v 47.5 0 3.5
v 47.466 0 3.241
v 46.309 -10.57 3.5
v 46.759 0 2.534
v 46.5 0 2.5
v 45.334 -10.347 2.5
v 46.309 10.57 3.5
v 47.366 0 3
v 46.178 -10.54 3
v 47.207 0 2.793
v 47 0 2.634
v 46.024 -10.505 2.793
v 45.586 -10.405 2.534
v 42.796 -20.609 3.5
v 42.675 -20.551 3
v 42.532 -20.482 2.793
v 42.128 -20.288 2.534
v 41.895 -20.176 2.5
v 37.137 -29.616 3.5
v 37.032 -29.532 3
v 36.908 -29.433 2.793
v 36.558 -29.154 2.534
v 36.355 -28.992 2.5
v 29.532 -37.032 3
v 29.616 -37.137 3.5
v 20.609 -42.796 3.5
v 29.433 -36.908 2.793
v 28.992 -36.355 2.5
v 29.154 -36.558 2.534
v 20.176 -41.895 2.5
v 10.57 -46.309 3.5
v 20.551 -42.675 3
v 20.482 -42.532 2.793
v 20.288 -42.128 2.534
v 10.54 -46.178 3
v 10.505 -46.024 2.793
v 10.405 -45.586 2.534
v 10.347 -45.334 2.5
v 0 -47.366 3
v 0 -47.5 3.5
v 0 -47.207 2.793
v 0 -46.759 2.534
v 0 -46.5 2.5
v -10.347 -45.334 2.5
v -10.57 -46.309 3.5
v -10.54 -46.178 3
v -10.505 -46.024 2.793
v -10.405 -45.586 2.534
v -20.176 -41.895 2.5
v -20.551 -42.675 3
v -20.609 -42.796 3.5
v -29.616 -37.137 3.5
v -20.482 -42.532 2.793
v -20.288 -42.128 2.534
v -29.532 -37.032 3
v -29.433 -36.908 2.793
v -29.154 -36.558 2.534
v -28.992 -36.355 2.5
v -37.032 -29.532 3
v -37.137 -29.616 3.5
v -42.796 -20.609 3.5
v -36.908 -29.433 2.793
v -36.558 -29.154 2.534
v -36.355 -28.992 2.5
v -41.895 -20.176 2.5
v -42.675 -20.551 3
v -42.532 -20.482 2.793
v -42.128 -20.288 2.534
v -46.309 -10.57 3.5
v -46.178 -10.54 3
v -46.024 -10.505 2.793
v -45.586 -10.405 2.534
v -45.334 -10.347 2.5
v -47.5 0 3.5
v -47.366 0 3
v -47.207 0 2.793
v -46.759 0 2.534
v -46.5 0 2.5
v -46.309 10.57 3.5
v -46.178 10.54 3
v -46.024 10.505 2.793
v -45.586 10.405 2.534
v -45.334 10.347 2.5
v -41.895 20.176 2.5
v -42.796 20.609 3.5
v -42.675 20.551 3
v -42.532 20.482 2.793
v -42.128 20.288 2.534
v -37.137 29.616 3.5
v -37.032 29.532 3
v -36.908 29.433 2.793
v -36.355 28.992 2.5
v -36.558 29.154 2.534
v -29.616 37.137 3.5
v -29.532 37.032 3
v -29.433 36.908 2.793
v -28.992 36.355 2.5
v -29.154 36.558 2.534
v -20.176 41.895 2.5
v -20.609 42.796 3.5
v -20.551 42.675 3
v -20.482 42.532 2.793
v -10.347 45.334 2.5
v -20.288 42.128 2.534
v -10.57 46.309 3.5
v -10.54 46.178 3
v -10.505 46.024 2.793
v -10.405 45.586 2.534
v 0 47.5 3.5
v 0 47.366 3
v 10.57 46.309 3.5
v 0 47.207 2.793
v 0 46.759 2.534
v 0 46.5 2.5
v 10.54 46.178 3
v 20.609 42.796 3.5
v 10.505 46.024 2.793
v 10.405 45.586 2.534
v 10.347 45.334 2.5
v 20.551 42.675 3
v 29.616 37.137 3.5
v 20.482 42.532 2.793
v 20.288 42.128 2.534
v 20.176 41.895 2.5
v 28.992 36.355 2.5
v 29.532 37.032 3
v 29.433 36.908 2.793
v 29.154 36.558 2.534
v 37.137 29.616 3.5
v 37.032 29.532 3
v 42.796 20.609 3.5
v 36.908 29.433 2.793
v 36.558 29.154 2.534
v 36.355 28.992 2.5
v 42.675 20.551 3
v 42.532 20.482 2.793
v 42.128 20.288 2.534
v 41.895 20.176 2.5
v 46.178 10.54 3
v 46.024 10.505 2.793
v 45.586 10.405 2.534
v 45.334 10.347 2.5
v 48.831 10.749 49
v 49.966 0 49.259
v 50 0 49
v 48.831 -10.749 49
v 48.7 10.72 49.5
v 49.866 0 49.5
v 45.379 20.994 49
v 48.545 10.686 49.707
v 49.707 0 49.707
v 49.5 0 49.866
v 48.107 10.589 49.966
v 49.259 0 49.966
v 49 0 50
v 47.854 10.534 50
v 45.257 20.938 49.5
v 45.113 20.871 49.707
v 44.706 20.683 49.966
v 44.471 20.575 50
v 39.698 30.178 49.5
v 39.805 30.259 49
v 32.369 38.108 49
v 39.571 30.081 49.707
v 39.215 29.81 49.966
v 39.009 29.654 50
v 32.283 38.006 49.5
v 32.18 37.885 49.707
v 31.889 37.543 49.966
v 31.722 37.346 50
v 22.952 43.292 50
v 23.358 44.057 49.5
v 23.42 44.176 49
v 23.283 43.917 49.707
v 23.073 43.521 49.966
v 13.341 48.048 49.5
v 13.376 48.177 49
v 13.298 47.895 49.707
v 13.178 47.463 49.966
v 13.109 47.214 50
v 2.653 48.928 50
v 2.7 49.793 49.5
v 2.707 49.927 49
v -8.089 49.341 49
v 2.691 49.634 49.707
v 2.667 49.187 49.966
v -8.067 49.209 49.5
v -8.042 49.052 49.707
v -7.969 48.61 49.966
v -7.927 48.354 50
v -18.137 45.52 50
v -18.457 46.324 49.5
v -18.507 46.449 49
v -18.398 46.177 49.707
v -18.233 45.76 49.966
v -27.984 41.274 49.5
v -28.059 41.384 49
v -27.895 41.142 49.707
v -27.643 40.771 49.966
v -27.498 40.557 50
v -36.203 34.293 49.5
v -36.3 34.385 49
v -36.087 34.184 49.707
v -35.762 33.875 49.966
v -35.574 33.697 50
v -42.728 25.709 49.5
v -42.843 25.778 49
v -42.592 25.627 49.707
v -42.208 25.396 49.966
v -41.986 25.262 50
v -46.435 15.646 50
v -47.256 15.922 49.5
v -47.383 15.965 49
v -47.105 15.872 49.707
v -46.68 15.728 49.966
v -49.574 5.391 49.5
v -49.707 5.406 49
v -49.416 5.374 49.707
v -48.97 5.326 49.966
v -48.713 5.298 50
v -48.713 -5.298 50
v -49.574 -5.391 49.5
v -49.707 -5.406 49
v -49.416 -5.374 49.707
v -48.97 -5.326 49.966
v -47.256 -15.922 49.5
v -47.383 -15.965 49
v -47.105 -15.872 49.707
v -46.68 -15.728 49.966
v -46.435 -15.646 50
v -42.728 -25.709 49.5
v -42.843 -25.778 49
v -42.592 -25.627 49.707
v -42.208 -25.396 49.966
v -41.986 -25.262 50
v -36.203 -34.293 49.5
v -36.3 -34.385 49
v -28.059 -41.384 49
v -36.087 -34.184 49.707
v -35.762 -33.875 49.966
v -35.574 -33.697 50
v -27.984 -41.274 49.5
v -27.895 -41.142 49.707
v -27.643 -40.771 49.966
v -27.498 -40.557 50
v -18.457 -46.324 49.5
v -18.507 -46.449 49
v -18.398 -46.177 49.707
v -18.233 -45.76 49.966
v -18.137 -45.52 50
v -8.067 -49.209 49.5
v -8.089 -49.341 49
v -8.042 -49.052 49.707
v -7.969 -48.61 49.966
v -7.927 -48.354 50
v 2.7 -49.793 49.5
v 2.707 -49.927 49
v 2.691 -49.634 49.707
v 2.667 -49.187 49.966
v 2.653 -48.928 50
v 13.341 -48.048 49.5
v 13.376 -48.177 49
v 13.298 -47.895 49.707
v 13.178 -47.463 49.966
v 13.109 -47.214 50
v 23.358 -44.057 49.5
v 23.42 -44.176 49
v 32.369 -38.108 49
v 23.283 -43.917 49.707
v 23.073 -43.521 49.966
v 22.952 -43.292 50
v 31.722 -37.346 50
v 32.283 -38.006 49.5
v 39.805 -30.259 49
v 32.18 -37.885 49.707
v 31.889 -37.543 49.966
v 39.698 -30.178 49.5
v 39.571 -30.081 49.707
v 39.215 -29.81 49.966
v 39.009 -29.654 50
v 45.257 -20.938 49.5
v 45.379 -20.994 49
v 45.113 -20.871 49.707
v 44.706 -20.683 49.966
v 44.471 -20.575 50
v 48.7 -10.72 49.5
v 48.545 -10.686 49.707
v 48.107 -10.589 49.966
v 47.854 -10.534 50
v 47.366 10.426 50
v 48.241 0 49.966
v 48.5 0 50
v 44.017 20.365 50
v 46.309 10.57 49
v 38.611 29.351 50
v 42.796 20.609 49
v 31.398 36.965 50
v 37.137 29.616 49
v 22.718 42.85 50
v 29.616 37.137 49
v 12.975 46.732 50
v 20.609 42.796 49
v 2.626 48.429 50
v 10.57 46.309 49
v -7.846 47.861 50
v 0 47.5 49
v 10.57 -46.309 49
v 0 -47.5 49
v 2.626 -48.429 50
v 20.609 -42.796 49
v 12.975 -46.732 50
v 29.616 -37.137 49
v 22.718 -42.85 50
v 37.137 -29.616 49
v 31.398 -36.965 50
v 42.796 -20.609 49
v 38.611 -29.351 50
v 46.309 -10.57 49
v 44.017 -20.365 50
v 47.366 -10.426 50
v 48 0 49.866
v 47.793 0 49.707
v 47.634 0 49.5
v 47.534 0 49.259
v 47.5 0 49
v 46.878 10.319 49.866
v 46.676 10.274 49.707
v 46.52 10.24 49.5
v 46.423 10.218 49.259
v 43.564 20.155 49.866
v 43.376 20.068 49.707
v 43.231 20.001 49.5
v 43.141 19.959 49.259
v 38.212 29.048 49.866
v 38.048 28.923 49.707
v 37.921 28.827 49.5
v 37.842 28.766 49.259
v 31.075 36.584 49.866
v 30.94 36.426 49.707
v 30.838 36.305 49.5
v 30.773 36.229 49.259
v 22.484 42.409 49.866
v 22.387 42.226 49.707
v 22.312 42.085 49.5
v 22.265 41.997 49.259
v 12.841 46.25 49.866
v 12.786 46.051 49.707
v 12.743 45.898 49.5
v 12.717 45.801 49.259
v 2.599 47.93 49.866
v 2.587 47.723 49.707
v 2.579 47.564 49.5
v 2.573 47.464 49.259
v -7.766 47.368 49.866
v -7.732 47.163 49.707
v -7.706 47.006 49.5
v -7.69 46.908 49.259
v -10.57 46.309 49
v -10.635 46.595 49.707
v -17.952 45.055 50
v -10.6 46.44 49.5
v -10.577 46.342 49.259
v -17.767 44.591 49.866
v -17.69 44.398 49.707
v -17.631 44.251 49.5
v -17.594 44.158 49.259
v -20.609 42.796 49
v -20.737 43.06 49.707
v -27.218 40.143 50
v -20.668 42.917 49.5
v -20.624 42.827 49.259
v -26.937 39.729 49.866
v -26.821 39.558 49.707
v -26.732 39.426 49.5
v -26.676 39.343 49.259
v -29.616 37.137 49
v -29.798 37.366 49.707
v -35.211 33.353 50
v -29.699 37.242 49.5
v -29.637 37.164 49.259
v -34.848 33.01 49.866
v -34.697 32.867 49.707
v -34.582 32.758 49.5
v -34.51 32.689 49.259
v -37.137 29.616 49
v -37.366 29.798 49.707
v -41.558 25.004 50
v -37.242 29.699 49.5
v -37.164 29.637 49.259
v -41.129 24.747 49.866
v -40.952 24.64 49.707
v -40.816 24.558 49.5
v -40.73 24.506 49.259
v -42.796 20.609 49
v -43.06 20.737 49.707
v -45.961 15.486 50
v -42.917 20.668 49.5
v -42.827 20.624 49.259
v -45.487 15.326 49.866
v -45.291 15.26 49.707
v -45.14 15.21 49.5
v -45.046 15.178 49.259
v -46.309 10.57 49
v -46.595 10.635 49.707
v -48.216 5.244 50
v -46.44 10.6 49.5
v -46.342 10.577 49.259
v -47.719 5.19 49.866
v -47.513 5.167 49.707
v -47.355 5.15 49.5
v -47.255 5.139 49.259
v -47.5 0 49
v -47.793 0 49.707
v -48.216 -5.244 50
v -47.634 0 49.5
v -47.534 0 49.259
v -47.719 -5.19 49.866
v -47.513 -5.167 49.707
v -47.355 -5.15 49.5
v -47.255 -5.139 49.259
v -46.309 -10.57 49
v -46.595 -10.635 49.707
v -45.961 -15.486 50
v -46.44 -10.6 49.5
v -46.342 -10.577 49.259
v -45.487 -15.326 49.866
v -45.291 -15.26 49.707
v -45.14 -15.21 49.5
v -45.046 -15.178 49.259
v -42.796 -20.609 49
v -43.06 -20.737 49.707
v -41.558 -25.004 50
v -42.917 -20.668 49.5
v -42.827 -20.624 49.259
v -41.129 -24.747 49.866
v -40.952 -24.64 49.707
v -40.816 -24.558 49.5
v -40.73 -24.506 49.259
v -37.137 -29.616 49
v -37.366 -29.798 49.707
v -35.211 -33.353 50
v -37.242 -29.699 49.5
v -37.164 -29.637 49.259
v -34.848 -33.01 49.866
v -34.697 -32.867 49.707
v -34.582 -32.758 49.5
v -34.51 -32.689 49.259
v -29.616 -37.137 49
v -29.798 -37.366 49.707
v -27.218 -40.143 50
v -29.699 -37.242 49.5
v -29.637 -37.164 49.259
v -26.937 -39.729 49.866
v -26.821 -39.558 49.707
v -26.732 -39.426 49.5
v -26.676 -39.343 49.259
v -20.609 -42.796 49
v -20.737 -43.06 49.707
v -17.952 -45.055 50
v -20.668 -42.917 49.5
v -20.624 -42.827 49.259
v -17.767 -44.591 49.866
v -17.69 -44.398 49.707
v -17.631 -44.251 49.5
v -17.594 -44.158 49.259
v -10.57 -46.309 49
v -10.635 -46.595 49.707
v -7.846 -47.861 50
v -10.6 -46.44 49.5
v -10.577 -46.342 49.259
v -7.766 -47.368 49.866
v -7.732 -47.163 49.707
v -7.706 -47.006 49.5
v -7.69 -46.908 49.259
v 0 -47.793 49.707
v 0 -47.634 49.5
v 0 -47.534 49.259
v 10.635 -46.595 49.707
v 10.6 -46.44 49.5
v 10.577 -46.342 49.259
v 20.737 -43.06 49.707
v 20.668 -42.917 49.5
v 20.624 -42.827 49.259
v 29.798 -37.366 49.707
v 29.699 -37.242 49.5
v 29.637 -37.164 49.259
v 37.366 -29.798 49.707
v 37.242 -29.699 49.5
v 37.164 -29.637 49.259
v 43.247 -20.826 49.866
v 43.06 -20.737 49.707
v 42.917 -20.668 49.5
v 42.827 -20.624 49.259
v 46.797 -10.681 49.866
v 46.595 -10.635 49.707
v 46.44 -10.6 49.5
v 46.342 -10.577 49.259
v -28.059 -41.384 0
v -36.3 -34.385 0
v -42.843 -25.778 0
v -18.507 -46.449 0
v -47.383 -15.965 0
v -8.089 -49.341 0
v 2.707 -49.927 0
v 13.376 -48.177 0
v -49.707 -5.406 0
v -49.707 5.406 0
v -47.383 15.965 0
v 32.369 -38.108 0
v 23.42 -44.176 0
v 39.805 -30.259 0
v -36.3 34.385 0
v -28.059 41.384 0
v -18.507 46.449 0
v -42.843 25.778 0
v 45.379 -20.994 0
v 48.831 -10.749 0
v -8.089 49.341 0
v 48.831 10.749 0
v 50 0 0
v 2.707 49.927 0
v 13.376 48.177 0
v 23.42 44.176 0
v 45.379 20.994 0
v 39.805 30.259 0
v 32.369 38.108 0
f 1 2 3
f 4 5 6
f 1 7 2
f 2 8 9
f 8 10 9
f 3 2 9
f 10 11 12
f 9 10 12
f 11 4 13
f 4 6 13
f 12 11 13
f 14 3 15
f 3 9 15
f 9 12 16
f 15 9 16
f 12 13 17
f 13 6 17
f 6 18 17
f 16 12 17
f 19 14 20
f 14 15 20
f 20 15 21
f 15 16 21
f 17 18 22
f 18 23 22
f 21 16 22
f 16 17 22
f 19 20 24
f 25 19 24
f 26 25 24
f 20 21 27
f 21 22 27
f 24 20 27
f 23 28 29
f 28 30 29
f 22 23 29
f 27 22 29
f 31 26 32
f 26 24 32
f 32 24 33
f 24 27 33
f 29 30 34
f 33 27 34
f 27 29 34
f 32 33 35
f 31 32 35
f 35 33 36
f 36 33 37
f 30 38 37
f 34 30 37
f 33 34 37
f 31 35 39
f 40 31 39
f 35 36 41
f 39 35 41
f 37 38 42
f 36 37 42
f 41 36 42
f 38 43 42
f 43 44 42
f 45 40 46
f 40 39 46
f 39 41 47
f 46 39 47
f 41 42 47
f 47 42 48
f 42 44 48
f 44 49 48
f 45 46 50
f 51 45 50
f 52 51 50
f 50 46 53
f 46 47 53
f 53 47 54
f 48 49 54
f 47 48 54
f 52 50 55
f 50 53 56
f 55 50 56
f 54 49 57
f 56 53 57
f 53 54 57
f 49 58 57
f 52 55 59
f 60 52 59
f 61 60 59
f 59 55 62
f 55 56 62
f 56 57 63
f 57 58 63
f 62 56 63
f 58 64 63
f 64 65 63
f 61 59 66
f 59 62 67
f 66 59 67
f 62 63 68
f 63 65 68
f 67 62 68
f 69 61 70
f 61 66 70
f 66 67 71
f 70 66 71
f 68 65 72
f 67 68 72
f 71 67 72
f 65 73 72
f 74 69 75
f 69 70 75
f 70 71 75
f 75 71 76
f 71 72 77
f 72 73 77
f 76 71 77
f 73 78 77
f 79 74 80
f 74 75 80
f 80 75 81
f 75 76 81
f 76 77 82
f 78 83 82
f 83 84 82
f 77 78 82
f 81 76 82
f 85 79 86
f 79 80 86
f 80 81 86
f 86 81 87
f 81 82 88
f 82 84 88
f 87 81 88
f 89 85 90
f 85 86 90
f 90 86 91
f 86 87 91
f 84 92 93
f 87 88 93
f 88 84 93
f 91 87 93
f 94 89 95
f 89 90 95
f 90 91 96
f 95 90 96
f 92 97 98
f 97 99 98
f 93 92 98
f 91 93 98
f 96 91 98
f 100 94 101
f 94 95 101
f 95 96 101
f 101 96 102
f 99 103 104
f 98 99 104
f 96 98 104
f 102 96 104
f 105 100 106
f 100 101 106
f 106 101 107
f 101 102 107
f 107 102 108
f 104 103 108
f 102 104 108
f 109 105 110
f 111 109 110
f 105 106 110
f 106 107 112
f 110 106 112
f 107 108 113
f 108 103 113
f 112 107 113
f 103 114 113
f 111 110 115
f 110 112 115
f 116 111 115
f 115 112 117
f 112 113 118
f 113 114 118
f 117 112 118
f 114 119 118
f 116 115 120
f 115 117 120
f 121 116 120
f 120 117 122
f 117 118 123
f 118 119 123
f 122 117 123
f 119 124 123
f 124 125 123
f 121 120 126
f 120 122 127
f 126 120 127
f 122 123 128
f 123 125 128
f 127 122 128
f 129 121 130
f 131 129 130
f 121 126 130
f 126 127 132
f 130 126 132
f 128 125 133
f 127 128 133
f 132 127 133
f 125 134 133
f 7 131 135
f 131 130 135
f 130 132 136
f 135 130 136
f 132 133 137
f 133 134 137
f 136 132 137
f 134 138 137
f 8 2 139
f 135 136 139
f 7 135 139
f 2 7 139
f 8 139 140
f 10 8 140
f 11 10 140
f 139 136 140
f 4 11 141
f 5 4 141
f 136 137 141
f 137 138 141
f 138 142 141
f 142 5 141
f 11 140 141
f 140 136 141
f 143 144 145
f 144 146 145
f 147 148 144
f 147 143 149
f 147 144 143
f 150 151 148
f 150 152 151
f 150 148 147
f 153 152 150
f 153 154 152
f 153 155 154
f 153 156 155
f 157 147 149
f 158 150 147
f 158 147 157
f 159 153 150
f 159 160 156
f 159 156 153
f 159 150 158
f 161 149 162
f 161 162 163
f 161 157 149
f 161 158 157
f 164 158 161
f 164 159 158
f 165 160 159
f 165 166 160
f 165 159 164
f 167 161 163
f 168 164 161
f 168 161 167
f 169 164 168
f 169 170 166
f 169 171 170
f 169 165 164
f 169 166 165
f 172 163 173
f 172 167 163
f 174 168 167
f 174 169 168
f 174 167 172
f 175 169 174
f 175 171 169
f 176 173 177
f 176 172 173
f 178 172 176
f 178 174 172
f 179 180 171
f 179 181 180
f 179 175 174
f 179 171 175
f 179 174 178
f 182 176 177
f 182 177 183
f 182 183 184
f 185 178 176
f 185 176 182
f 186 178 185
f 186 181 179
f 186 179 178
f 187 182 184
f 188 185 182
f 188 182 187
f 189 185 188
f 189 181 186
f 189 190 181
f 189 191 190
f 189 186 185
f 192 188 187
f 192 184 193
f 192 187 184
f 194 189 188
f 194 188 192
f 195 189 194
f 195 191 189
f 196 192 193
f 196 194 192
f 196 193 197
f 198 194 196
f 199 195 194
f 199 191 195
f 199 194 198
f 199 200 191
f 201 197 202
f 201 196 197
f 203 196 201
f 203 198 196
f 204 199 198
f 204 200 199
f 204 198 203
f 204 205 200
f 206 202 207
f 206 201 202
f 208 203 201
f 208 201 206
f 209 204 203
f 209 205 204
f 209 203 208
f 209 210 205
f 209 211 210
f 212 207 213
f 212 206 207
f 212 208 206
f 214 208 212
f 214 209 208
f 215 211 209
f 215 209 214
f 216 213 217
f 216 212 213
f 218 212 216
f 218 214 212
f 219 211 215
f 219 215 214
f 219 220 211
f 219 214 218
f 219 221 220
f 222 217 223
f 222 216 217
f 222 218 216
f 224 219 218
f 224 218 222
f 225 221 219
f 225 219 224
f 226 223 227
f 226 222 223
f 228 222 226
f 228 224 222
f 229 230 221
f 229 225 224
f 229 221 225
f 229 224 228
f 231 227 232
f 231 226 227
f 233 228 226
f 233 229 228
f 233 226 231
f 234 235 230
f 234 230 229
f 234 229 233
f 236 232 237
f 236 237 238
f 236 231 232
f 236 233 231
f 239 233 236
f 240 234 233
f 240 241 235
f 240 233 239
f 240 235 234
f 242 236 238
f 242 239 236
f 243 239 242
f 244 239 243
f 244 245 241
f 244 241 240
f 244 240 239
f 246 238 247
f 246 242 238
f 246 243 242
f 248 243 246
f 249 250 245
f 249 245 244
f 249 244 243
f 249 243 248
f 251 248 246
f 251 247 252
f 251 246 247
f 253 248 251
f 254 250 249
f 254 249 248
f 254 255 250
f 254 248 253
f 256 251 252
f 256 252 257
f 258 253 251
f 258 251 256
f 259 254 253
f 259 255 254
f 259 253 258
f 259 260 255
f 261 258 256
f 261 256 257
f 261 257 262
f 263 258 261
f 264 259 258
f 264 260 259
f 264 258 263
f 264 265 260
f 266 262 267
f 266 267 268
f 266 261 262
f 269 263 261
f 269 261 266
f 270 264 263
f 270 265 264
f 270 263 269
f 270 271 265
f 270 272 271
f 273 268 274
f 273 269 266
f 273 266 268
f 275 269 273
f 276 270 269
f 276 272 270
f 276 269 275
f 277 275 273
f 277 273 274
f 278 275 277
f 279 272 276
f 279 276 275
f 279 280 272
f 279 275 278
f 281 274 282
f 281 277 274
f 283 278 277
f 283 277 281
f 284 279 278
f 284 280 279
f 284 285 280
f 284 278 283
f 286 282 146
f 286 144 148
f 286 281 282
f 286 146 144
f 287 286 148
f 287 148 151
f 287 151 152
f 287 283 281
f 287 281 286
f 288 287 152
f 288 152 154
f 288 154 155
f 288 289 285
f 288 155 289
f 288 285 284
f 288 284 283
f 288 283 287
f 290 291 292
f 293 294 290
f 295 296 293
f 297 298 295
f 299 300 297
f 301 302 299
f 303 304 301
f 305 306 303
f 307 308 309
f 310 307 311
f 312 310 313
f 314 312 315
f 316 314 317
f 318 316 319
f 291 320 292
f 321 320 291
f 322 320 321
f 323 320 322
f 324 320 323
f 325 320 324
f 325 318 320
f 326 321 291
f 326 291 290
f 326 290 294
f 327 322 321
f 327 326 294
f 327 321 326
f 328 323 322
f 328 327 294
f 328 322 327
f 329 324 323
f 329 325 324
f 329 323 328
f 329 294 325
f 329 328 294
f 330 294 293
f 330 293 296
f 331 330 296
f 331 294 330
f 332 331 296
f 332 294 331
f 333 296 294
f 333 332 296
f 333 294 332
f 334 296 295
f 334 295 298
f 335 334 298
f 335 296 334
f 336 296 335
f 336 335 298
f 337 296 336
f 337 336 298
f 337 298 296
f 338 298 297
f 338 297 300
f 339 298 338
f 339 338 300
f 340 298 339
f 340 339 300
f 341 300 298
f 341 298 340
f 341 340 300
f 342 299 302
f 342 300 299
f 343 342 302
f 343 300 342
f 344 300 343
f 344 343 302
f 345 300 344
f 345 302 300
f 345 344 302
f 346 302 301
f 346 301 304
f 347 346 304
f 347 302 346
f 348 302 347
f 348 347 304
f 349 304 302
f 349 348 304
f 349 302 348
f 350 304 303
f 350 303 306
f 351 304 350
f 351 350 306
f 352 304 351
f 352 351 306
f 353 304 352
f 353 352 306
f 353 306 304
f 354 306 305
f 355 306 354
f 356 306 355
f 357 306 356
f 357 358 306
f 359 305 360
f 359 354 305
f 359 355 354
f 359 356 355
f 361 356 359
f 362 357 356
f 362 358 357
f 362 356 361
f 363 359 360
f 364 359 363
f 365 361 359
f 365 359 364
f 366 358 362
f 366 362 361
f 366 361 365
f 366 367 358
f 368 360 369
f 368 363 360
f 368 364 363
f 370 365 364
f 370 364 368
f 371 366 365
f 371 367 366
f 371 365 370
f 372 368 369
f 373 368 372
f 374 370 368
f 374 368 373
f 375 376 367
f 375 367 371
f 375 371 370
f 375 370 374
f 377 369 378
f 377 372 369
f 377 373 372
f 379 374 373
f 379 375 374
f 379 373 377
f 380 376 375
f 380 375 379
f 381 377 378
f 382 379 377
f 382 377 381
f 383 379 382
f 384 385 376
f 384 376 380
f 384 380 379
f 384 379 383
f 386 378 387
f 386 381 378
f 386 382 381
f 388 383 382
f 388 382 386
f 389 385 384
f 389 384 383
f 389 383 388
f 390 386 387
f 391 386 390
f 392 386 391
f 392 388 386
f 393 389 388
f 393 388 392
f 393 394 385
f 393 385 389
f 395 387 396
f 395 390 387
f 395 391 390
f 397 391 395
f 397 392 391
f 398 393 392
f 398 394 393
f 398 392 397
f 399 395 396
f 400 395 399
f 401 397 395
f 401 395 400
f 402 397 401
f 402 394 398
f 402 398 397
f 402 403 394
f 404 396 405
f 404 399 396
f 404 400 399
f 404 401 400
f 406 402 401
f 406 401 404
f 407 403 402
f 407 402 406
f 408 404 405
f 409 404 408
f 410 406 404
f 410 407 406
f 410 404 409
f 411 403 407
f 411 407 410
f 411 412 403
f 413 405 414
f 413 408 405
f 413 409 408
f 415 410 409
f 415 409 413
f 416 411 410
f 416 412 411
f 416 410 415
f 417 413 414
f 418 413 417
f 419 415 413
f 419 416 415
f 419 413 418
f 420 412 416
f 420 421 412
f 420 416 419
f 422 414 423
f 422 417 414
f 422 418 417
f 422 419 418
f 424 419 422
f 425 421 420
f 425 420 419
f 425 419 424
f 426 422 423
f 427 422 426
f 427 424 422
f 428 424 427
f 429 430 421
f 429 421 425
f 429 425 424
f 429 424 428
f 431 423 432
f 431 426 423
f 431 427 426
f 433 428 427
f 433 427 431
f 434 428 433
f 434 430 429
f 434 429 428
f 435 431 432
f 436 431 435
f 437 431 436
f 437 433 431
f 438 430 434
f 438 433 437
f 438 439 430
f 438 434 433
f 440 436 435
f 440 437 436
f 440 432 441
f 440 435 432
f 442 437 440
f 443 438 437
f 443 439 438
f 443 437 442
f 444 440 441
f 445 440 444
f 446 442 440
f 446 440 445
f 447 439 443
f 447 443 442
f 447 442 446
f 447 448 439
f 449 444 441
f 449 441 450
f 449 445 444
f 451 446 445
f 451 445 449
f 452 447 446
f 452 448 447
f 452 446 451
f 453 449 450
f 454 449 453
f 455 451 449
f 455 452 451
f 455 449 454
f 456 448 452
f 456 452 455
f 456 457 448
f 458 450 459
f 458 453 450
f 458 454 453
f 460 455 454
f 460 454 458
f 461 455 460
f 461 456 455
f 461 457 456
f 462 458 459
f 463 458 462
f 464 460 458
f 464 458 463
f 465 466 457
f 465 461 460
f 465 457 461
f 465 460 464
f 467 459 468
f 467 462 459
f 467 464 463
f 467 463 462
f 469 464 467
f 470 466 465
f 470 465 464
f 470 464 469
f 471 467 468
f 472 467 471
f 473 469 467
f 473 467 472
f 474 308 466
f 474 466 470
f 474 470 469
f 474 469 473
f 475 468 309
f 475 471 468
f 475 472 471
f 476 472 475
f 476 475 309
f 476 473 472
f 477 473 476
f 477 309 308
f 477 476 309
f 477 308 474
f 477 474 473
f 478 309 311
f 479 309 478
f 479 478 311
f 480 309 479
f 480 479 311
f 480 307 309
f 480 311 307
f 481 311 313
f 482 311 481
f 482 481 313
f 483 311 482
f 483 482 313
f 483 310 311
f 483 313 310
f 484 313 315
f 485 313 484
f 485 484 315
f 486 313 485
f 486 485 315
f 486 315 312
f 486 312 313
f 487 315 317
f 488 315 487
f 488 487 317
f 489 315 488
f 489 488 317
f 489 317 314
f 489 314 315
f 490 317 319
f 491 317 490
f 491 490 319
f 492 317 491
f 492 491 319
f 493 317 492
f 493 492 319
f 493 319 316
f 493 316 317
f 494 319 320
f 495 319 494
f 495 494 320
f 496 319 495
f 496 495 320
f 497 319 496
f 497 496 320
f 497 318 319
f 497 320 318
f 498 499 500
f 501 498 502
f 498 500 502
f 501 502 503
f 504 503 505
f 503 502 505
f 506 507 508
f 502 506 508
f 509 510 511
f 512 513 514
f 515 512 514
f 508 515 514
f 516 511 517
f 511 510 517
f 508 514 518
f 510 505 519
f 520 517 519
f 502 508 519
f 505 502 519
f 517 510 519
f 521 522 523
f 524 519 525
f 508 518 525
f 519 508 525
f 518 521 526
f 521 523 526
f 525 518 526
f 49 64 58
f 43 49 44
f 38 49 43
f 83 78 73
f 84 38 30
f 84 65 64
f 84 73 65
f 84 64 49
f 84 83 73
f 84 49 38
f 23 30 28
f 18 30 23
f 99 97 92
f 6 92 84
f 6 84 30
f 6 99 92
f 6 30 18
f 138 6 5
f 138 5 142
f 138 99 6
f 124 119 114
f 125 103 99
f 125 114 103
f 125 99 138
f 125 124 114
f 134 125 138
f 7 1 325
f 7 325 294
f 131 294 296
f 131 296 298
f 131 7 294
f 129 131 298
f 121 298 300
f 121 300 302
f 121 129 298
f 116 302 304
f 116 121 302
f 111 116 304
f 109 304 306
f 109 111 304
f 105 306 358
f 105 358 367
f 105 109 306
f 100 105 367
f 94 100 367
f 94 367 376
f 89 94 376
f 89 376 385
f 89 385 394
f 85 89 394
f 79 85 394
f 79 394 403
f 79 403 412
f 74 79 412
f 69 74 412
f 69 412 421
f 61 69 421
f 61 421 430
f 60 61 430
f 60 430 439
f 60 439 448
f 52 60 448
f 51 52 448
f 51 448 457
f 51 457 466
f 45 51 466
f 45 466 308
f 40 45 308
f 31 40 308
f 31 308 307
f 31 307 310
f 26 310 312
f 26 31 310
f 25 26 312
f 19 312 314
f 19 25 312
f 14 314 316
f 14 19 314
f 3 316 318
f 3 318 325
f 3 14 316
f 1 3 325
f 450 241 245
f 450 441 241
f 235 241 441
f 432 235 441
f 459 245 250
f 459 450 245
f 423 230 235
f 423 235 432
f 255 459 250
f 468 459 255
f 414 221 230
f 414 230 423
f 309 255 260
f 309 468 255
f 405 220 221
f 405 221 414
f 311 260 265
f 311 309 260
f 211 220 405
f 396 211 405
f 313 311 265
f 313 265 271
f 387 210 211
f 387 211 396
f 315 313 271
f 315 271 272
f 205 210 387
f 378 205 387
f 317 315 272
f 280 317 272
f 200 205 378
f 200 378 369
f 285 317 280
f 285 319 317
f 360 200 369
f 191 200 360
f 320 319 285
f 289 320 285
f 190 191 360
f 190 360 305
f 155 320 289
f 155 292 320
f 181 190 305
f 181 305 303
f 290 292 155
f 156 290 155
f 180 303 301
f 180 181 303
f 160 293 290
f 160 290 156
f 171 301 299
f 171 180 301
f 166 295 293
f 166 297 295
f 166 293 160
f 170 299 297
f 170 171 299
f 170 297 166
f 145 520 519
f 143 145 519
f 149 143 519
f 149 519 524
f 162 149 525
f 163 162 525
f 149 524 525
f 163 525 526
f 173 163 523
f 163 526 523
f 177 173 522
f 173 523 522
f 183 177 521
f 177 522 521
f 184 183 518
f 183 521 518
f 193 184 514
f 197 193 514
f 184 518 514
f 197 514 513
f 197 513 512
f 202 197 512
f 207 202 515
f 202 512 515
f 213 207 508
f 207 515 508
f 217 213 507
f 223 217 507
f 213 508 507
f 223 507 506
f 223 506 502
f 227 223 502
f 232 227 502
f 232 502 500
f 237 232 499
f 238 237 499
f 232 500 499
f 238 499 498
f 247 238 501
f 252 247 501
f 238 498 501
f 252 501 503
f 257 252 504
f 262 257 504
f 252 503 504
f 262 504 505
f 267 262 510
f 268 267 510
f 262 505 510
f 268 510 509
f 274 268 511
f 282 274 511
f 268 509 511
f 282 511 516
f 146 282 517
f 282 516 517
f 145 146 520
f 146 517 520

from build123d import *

# Parameters (mm, degrees)
F0_R     = 50
F1_DEPTH = 50
F2_T     = -2.5
F3_R     = 1


with BuildPart() as f1:
    # F0 (on Top) → F1 (new body)
    with BuildSketch(Plane.XY):
        Circle(F0_R)
    extrude(amount=F1_DEPTH)

    # F2
    f2_openings = [f1.faces().sort_by_distance(p)[0] for p in [
        (0, 0, 50),
    ]]
    offset(amount=F2_T, openings=f2_openings)

    # F3
    f3_edges = [f1.edges().sort_by_distance(p)[0] for p in [
        (-50, 0, 50),
        (-47.5, 0, 50),
        (-47.5, 0, 2.5),
    ]]
    fillet(f3_edges, radius=F3_R)


solid = f1.part
